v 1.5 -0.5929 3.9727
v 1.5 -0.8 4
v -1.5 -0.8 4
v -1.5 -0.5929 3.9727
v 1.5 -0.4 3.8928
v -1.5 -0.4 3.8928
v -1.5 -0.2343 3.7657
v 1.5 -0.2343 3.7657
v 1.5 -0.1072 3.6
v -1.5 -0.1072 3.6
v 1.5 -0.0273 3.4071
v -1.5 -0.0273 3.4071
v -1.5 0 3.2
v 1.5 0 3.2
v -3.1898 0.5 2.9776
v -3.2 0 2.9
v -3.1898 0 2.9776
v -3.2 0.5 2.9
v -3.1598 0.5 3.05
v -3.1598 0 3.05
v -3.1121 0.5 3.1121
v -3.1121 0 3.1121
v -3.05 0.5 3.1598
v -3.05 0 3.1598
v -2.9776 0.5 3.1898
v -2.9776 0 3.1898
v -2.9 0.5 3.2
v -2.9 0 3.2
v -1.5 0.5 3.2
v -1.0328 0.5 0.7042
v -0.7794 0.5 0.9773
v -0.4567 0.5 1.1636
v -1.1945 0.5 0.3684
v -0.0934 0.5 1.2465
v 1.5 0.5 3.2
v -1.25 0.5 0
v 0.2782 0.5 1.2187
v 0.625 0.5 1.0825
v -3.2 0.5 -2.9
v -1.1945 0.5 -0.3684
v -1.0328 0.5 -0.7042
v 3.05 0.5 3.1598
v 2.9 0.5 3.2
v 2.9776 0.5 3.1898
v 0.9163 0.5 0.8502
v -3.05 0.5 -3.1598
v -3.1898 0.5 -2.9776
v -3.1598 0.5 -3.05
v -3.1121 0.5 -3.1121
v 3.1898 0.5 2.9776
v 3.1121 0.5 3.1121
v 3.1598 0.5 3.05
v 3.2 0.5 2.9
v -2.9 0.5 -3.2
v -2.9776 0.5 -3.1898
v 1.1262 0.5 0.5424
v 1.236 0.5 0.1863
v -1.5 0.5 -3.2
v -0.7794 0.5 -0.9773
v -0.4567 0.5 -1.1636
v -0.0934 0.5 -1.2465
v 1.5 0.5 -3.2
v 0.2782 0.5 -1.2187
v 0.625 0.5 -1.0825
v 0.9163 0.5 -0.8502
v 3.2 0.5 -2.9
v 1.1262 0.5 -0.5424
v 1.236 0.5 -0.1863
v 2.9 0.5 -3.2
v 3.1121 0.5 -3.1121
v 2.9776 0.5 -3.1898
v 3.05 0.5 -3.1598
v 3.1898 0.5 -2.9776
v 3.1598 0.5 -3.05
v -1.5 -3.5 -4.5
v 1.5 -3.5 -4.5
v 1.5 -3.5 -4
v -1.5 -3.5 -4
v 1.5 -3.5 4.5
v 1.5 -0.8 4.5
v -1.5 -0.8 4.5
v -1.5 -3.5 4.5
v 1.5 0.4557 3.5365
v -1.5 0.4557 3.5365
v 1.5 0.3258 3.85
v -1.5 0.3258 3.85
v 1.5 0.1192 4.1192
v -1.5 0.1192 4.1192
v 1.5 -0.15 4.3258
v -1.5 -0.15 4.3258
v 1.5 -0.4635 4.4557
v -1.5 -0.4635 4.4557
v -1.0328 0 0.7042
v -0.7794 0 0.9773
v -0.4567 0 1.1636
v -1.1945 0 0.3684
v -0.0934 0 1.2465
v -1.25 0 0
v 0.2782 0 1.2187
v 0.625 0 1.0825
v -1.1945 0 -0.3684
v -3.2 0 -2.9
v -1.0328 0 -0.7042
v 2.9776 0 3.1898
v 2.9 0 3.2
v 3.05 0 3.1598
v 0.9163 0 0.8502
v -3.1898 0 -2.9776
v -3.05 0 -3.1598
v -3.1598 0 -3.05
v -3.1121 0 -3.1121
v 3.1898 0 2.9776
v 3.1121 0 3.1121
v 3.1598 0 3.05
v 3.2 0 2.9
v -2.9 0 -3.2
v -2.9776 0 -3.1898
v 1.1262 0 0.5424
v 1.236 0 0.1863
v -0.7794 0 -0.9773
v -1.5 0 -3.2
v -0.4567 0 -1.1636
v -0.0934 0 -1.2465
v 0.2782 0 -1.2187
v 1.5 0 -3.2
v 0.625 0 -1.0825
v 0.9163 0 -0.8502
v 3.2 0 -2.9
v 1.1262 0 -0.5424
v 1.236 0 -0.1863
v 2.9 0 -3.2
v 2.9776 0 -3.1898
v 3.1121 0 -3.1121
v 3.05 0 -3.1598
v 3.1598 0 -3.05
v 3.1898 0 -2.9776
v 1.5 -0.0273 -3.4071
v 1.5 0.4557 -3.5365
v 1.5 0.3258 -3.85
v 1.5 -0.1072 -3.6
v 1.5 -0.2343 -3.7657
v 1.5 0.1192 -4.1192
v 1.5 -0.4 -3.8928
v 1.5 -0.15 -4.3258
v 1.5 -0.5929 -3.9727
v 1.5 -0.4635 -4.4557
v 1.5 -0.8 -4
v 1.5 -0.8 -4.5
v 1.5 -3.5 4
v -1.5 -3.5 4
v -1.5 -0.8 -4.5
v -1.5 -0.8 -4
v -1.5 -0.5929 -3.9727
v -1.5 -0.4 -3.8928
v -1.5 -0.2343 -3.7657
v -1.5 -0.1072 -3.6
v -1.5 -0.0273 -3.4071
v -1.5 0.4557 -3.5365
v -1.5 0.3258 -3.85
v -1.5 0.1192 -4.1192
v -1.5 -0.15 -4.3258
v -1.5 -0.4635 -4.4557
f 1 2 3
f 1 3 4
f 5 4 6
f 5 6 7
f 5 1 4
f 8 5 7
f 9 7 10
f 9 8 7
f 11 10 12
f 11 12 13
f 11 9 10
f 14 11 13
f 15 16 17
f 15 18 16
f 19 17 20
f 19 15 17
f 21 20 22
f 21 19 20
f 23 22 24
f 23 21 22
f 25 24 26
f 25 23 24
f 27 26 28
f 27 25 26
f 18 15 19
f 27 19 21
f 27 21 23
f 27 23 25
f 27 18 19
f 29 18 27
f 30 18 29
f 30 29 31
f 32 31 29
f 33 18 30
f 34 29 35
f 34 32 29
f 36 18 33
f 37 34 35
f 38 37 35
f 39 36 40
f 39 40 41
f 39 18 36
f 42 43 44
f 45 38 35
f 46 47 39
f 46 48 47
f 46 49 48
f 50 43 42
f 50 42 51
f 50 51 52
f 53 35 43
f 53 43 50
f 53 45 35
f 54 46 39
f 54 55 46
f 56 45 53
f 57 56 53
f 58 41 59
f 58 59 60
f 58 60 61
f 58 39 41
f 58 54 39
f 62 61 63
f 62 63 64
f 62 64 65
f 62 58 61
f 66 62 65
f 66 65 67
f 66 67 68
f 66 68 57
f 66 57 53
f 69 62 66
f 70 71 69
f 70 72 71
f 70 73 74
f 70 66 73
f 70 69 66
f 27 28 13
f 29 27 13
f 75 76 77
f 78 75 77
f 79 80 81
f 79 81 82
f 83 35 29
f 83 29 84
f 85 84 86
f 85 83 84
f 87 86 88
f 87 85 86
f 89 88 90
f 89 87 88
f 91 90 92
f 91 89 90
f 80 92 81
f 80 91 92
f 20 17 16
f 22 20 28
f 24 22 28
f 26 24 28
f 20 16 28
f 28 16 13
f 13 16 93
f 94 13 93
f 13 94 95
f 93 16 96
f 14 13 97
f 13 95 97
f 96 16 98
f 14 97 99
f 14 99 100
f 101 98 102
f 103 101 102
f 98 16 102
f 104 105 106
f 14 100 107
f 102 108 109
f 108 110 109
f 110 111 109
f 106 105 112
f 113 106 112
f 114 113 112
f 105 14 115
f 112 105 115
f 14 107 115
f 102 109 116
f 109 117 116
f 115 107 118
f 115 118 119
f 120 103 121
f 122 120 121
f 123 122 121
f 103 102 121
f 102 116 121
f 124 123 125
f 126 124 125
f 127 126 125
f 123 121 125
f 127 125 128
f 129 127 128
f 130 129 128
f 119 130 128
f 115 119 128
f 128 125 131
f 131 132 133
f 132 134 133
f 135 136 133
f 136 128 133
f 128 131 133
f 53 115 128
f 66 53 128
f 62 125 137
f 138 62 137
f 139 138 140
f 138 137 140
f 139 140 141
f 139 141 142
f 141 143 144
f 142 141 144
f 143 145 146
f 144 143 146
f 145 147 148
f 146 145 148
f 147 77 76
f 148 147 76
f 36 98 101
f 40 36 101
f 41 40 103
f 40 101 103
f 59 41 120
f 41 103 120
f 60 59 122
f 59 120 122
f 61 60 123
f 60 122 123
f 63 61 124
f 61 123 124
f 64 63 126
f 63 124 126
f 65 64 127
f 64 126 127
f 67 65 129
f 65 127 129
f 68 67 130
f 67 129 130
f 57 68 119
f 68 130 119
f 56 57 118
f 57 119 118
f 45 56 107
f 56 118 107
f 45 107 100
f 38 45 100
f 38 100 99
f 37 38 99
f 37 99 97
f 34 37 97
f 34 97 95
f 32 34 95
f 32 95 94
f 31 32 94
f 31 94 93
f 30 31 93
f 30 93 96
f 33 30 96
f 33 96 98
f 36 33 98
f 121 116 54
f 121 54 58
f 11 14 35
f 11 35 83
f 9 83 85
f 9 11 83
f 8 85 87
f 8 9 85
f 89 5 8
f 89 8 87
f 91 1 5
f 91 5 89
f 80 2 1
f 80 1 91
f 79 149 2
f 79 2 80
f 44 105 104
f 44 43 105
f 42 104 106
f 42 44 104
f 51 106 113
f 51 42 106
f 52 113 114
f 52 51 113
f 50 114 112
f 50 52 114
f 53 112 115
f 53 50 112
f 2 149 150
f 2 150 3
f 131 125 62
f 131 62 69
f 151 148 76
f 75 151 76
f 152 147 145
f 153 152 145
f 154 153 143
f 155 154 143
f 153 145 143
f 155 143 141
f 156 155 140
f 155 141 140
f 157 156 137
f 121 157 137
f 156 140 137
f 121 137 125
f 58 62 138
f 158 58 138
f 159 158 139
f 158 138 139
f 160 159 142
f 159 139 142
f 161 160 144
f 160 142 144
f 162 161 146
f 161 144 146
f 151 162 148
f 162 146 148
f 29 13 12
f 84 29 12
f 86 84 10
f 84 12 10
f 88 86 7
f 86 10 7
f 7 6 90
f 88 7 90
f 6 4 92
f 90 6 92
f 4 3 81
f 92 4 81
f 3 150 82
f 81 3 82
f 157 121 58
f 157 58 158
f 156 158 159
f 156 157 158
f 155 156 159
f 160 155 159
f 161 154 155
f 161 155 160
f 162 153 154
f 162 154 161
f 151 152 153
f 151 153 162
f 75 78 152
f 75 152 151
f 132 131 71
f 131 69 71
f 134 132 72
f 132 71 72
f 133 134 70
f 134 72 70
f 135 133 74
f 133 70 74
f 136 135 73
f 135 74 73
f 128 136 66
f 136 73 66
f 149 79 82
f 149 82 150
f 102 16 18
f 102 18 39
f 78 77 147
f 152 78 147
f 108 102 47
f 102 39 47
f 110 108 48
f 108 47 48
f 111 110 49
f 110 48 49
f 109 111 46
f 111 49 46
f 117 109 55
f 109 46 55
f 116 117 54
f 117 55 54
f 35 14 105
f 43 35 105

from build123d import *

# Parameters (mm, degrees)
SKETCH1_W             = 6.4
SKETCH1_H             = 6.4
BOSS_EXTRUDE1_DEPTH   = 0.5
M3X0_5_TAPPED_HOLE1_D = 2.5
EDGE_FLANGE1_DEPTH    = 3
FILLET1_R             = 0.3


# Sheet-metal steps are written as plain solids
with BuildPart() as part:
    # Sketch1 → Boss-Extrude1 (new body)
    with BuildSketch(Plane(origin=(0, 0, 0), x_dir=(1, 0, 0), z_dir=(0, 1, 0))):
        Rectangle(SKETCH1_W, SKETCH1_H)
    extrude(amount=BOSS_EXTRUDE1_DEPTH)

    # M3x0.5 Tapped Hole1 (through all)
    with Locations(Plane(origin=(0, 0.5, 0), x_dir=(1, 0, 0), z_dir=(0, 1, 0))):
        with Locations((0, 0)):
            Hole(M3X0_5_TAPPED_HOLE1_D / 2)

    # Edge-Flange1 section (across the edge) → Edge-Flange1 (add)
    with BuildSketch(Plane(origin=(1.5, 0, 4), x_dir=(0, 0, -1), z_dir=(-1, 0, 0))):
        with BuildLine():
            Line((-0.5, 0.8), (-0.5, 3.5))
            Line((-0.5, 3.5), (0, 3.5))
            Line((0, 3.5), (0, 0.8))
            ThreePointArc((0, 0.8), (0.234314575, 0.234314575), (0.8, 0))
            Line((0.8, 0), (0.8, -0.5))
            ThreePointArc((0.8, -0.5), (-0.119238816, -0.119238816), (-0.5, 0.8))
        make_face()
    edge_flange1 = extrude(amount=EDGE_FLANGE1_DEPTH)

    # Mirror1: Edge-Flange1 across plane
    add(edge_flange1.mirror(Plane.XY))

    # Fillet1
    fillet1_edges = [part.edges().sort_by_distance(p)[0] for p in [
        (-3.2, 0.25, 3.2),
        (3.2, 0.25, 3.2),
        (3.2, 0.25, -3.2),
        (-3.2, 0.25, -3.2),
    ]]
    fillet(fillet1_edges, radius=FILLET1_R)


solid = part.part
